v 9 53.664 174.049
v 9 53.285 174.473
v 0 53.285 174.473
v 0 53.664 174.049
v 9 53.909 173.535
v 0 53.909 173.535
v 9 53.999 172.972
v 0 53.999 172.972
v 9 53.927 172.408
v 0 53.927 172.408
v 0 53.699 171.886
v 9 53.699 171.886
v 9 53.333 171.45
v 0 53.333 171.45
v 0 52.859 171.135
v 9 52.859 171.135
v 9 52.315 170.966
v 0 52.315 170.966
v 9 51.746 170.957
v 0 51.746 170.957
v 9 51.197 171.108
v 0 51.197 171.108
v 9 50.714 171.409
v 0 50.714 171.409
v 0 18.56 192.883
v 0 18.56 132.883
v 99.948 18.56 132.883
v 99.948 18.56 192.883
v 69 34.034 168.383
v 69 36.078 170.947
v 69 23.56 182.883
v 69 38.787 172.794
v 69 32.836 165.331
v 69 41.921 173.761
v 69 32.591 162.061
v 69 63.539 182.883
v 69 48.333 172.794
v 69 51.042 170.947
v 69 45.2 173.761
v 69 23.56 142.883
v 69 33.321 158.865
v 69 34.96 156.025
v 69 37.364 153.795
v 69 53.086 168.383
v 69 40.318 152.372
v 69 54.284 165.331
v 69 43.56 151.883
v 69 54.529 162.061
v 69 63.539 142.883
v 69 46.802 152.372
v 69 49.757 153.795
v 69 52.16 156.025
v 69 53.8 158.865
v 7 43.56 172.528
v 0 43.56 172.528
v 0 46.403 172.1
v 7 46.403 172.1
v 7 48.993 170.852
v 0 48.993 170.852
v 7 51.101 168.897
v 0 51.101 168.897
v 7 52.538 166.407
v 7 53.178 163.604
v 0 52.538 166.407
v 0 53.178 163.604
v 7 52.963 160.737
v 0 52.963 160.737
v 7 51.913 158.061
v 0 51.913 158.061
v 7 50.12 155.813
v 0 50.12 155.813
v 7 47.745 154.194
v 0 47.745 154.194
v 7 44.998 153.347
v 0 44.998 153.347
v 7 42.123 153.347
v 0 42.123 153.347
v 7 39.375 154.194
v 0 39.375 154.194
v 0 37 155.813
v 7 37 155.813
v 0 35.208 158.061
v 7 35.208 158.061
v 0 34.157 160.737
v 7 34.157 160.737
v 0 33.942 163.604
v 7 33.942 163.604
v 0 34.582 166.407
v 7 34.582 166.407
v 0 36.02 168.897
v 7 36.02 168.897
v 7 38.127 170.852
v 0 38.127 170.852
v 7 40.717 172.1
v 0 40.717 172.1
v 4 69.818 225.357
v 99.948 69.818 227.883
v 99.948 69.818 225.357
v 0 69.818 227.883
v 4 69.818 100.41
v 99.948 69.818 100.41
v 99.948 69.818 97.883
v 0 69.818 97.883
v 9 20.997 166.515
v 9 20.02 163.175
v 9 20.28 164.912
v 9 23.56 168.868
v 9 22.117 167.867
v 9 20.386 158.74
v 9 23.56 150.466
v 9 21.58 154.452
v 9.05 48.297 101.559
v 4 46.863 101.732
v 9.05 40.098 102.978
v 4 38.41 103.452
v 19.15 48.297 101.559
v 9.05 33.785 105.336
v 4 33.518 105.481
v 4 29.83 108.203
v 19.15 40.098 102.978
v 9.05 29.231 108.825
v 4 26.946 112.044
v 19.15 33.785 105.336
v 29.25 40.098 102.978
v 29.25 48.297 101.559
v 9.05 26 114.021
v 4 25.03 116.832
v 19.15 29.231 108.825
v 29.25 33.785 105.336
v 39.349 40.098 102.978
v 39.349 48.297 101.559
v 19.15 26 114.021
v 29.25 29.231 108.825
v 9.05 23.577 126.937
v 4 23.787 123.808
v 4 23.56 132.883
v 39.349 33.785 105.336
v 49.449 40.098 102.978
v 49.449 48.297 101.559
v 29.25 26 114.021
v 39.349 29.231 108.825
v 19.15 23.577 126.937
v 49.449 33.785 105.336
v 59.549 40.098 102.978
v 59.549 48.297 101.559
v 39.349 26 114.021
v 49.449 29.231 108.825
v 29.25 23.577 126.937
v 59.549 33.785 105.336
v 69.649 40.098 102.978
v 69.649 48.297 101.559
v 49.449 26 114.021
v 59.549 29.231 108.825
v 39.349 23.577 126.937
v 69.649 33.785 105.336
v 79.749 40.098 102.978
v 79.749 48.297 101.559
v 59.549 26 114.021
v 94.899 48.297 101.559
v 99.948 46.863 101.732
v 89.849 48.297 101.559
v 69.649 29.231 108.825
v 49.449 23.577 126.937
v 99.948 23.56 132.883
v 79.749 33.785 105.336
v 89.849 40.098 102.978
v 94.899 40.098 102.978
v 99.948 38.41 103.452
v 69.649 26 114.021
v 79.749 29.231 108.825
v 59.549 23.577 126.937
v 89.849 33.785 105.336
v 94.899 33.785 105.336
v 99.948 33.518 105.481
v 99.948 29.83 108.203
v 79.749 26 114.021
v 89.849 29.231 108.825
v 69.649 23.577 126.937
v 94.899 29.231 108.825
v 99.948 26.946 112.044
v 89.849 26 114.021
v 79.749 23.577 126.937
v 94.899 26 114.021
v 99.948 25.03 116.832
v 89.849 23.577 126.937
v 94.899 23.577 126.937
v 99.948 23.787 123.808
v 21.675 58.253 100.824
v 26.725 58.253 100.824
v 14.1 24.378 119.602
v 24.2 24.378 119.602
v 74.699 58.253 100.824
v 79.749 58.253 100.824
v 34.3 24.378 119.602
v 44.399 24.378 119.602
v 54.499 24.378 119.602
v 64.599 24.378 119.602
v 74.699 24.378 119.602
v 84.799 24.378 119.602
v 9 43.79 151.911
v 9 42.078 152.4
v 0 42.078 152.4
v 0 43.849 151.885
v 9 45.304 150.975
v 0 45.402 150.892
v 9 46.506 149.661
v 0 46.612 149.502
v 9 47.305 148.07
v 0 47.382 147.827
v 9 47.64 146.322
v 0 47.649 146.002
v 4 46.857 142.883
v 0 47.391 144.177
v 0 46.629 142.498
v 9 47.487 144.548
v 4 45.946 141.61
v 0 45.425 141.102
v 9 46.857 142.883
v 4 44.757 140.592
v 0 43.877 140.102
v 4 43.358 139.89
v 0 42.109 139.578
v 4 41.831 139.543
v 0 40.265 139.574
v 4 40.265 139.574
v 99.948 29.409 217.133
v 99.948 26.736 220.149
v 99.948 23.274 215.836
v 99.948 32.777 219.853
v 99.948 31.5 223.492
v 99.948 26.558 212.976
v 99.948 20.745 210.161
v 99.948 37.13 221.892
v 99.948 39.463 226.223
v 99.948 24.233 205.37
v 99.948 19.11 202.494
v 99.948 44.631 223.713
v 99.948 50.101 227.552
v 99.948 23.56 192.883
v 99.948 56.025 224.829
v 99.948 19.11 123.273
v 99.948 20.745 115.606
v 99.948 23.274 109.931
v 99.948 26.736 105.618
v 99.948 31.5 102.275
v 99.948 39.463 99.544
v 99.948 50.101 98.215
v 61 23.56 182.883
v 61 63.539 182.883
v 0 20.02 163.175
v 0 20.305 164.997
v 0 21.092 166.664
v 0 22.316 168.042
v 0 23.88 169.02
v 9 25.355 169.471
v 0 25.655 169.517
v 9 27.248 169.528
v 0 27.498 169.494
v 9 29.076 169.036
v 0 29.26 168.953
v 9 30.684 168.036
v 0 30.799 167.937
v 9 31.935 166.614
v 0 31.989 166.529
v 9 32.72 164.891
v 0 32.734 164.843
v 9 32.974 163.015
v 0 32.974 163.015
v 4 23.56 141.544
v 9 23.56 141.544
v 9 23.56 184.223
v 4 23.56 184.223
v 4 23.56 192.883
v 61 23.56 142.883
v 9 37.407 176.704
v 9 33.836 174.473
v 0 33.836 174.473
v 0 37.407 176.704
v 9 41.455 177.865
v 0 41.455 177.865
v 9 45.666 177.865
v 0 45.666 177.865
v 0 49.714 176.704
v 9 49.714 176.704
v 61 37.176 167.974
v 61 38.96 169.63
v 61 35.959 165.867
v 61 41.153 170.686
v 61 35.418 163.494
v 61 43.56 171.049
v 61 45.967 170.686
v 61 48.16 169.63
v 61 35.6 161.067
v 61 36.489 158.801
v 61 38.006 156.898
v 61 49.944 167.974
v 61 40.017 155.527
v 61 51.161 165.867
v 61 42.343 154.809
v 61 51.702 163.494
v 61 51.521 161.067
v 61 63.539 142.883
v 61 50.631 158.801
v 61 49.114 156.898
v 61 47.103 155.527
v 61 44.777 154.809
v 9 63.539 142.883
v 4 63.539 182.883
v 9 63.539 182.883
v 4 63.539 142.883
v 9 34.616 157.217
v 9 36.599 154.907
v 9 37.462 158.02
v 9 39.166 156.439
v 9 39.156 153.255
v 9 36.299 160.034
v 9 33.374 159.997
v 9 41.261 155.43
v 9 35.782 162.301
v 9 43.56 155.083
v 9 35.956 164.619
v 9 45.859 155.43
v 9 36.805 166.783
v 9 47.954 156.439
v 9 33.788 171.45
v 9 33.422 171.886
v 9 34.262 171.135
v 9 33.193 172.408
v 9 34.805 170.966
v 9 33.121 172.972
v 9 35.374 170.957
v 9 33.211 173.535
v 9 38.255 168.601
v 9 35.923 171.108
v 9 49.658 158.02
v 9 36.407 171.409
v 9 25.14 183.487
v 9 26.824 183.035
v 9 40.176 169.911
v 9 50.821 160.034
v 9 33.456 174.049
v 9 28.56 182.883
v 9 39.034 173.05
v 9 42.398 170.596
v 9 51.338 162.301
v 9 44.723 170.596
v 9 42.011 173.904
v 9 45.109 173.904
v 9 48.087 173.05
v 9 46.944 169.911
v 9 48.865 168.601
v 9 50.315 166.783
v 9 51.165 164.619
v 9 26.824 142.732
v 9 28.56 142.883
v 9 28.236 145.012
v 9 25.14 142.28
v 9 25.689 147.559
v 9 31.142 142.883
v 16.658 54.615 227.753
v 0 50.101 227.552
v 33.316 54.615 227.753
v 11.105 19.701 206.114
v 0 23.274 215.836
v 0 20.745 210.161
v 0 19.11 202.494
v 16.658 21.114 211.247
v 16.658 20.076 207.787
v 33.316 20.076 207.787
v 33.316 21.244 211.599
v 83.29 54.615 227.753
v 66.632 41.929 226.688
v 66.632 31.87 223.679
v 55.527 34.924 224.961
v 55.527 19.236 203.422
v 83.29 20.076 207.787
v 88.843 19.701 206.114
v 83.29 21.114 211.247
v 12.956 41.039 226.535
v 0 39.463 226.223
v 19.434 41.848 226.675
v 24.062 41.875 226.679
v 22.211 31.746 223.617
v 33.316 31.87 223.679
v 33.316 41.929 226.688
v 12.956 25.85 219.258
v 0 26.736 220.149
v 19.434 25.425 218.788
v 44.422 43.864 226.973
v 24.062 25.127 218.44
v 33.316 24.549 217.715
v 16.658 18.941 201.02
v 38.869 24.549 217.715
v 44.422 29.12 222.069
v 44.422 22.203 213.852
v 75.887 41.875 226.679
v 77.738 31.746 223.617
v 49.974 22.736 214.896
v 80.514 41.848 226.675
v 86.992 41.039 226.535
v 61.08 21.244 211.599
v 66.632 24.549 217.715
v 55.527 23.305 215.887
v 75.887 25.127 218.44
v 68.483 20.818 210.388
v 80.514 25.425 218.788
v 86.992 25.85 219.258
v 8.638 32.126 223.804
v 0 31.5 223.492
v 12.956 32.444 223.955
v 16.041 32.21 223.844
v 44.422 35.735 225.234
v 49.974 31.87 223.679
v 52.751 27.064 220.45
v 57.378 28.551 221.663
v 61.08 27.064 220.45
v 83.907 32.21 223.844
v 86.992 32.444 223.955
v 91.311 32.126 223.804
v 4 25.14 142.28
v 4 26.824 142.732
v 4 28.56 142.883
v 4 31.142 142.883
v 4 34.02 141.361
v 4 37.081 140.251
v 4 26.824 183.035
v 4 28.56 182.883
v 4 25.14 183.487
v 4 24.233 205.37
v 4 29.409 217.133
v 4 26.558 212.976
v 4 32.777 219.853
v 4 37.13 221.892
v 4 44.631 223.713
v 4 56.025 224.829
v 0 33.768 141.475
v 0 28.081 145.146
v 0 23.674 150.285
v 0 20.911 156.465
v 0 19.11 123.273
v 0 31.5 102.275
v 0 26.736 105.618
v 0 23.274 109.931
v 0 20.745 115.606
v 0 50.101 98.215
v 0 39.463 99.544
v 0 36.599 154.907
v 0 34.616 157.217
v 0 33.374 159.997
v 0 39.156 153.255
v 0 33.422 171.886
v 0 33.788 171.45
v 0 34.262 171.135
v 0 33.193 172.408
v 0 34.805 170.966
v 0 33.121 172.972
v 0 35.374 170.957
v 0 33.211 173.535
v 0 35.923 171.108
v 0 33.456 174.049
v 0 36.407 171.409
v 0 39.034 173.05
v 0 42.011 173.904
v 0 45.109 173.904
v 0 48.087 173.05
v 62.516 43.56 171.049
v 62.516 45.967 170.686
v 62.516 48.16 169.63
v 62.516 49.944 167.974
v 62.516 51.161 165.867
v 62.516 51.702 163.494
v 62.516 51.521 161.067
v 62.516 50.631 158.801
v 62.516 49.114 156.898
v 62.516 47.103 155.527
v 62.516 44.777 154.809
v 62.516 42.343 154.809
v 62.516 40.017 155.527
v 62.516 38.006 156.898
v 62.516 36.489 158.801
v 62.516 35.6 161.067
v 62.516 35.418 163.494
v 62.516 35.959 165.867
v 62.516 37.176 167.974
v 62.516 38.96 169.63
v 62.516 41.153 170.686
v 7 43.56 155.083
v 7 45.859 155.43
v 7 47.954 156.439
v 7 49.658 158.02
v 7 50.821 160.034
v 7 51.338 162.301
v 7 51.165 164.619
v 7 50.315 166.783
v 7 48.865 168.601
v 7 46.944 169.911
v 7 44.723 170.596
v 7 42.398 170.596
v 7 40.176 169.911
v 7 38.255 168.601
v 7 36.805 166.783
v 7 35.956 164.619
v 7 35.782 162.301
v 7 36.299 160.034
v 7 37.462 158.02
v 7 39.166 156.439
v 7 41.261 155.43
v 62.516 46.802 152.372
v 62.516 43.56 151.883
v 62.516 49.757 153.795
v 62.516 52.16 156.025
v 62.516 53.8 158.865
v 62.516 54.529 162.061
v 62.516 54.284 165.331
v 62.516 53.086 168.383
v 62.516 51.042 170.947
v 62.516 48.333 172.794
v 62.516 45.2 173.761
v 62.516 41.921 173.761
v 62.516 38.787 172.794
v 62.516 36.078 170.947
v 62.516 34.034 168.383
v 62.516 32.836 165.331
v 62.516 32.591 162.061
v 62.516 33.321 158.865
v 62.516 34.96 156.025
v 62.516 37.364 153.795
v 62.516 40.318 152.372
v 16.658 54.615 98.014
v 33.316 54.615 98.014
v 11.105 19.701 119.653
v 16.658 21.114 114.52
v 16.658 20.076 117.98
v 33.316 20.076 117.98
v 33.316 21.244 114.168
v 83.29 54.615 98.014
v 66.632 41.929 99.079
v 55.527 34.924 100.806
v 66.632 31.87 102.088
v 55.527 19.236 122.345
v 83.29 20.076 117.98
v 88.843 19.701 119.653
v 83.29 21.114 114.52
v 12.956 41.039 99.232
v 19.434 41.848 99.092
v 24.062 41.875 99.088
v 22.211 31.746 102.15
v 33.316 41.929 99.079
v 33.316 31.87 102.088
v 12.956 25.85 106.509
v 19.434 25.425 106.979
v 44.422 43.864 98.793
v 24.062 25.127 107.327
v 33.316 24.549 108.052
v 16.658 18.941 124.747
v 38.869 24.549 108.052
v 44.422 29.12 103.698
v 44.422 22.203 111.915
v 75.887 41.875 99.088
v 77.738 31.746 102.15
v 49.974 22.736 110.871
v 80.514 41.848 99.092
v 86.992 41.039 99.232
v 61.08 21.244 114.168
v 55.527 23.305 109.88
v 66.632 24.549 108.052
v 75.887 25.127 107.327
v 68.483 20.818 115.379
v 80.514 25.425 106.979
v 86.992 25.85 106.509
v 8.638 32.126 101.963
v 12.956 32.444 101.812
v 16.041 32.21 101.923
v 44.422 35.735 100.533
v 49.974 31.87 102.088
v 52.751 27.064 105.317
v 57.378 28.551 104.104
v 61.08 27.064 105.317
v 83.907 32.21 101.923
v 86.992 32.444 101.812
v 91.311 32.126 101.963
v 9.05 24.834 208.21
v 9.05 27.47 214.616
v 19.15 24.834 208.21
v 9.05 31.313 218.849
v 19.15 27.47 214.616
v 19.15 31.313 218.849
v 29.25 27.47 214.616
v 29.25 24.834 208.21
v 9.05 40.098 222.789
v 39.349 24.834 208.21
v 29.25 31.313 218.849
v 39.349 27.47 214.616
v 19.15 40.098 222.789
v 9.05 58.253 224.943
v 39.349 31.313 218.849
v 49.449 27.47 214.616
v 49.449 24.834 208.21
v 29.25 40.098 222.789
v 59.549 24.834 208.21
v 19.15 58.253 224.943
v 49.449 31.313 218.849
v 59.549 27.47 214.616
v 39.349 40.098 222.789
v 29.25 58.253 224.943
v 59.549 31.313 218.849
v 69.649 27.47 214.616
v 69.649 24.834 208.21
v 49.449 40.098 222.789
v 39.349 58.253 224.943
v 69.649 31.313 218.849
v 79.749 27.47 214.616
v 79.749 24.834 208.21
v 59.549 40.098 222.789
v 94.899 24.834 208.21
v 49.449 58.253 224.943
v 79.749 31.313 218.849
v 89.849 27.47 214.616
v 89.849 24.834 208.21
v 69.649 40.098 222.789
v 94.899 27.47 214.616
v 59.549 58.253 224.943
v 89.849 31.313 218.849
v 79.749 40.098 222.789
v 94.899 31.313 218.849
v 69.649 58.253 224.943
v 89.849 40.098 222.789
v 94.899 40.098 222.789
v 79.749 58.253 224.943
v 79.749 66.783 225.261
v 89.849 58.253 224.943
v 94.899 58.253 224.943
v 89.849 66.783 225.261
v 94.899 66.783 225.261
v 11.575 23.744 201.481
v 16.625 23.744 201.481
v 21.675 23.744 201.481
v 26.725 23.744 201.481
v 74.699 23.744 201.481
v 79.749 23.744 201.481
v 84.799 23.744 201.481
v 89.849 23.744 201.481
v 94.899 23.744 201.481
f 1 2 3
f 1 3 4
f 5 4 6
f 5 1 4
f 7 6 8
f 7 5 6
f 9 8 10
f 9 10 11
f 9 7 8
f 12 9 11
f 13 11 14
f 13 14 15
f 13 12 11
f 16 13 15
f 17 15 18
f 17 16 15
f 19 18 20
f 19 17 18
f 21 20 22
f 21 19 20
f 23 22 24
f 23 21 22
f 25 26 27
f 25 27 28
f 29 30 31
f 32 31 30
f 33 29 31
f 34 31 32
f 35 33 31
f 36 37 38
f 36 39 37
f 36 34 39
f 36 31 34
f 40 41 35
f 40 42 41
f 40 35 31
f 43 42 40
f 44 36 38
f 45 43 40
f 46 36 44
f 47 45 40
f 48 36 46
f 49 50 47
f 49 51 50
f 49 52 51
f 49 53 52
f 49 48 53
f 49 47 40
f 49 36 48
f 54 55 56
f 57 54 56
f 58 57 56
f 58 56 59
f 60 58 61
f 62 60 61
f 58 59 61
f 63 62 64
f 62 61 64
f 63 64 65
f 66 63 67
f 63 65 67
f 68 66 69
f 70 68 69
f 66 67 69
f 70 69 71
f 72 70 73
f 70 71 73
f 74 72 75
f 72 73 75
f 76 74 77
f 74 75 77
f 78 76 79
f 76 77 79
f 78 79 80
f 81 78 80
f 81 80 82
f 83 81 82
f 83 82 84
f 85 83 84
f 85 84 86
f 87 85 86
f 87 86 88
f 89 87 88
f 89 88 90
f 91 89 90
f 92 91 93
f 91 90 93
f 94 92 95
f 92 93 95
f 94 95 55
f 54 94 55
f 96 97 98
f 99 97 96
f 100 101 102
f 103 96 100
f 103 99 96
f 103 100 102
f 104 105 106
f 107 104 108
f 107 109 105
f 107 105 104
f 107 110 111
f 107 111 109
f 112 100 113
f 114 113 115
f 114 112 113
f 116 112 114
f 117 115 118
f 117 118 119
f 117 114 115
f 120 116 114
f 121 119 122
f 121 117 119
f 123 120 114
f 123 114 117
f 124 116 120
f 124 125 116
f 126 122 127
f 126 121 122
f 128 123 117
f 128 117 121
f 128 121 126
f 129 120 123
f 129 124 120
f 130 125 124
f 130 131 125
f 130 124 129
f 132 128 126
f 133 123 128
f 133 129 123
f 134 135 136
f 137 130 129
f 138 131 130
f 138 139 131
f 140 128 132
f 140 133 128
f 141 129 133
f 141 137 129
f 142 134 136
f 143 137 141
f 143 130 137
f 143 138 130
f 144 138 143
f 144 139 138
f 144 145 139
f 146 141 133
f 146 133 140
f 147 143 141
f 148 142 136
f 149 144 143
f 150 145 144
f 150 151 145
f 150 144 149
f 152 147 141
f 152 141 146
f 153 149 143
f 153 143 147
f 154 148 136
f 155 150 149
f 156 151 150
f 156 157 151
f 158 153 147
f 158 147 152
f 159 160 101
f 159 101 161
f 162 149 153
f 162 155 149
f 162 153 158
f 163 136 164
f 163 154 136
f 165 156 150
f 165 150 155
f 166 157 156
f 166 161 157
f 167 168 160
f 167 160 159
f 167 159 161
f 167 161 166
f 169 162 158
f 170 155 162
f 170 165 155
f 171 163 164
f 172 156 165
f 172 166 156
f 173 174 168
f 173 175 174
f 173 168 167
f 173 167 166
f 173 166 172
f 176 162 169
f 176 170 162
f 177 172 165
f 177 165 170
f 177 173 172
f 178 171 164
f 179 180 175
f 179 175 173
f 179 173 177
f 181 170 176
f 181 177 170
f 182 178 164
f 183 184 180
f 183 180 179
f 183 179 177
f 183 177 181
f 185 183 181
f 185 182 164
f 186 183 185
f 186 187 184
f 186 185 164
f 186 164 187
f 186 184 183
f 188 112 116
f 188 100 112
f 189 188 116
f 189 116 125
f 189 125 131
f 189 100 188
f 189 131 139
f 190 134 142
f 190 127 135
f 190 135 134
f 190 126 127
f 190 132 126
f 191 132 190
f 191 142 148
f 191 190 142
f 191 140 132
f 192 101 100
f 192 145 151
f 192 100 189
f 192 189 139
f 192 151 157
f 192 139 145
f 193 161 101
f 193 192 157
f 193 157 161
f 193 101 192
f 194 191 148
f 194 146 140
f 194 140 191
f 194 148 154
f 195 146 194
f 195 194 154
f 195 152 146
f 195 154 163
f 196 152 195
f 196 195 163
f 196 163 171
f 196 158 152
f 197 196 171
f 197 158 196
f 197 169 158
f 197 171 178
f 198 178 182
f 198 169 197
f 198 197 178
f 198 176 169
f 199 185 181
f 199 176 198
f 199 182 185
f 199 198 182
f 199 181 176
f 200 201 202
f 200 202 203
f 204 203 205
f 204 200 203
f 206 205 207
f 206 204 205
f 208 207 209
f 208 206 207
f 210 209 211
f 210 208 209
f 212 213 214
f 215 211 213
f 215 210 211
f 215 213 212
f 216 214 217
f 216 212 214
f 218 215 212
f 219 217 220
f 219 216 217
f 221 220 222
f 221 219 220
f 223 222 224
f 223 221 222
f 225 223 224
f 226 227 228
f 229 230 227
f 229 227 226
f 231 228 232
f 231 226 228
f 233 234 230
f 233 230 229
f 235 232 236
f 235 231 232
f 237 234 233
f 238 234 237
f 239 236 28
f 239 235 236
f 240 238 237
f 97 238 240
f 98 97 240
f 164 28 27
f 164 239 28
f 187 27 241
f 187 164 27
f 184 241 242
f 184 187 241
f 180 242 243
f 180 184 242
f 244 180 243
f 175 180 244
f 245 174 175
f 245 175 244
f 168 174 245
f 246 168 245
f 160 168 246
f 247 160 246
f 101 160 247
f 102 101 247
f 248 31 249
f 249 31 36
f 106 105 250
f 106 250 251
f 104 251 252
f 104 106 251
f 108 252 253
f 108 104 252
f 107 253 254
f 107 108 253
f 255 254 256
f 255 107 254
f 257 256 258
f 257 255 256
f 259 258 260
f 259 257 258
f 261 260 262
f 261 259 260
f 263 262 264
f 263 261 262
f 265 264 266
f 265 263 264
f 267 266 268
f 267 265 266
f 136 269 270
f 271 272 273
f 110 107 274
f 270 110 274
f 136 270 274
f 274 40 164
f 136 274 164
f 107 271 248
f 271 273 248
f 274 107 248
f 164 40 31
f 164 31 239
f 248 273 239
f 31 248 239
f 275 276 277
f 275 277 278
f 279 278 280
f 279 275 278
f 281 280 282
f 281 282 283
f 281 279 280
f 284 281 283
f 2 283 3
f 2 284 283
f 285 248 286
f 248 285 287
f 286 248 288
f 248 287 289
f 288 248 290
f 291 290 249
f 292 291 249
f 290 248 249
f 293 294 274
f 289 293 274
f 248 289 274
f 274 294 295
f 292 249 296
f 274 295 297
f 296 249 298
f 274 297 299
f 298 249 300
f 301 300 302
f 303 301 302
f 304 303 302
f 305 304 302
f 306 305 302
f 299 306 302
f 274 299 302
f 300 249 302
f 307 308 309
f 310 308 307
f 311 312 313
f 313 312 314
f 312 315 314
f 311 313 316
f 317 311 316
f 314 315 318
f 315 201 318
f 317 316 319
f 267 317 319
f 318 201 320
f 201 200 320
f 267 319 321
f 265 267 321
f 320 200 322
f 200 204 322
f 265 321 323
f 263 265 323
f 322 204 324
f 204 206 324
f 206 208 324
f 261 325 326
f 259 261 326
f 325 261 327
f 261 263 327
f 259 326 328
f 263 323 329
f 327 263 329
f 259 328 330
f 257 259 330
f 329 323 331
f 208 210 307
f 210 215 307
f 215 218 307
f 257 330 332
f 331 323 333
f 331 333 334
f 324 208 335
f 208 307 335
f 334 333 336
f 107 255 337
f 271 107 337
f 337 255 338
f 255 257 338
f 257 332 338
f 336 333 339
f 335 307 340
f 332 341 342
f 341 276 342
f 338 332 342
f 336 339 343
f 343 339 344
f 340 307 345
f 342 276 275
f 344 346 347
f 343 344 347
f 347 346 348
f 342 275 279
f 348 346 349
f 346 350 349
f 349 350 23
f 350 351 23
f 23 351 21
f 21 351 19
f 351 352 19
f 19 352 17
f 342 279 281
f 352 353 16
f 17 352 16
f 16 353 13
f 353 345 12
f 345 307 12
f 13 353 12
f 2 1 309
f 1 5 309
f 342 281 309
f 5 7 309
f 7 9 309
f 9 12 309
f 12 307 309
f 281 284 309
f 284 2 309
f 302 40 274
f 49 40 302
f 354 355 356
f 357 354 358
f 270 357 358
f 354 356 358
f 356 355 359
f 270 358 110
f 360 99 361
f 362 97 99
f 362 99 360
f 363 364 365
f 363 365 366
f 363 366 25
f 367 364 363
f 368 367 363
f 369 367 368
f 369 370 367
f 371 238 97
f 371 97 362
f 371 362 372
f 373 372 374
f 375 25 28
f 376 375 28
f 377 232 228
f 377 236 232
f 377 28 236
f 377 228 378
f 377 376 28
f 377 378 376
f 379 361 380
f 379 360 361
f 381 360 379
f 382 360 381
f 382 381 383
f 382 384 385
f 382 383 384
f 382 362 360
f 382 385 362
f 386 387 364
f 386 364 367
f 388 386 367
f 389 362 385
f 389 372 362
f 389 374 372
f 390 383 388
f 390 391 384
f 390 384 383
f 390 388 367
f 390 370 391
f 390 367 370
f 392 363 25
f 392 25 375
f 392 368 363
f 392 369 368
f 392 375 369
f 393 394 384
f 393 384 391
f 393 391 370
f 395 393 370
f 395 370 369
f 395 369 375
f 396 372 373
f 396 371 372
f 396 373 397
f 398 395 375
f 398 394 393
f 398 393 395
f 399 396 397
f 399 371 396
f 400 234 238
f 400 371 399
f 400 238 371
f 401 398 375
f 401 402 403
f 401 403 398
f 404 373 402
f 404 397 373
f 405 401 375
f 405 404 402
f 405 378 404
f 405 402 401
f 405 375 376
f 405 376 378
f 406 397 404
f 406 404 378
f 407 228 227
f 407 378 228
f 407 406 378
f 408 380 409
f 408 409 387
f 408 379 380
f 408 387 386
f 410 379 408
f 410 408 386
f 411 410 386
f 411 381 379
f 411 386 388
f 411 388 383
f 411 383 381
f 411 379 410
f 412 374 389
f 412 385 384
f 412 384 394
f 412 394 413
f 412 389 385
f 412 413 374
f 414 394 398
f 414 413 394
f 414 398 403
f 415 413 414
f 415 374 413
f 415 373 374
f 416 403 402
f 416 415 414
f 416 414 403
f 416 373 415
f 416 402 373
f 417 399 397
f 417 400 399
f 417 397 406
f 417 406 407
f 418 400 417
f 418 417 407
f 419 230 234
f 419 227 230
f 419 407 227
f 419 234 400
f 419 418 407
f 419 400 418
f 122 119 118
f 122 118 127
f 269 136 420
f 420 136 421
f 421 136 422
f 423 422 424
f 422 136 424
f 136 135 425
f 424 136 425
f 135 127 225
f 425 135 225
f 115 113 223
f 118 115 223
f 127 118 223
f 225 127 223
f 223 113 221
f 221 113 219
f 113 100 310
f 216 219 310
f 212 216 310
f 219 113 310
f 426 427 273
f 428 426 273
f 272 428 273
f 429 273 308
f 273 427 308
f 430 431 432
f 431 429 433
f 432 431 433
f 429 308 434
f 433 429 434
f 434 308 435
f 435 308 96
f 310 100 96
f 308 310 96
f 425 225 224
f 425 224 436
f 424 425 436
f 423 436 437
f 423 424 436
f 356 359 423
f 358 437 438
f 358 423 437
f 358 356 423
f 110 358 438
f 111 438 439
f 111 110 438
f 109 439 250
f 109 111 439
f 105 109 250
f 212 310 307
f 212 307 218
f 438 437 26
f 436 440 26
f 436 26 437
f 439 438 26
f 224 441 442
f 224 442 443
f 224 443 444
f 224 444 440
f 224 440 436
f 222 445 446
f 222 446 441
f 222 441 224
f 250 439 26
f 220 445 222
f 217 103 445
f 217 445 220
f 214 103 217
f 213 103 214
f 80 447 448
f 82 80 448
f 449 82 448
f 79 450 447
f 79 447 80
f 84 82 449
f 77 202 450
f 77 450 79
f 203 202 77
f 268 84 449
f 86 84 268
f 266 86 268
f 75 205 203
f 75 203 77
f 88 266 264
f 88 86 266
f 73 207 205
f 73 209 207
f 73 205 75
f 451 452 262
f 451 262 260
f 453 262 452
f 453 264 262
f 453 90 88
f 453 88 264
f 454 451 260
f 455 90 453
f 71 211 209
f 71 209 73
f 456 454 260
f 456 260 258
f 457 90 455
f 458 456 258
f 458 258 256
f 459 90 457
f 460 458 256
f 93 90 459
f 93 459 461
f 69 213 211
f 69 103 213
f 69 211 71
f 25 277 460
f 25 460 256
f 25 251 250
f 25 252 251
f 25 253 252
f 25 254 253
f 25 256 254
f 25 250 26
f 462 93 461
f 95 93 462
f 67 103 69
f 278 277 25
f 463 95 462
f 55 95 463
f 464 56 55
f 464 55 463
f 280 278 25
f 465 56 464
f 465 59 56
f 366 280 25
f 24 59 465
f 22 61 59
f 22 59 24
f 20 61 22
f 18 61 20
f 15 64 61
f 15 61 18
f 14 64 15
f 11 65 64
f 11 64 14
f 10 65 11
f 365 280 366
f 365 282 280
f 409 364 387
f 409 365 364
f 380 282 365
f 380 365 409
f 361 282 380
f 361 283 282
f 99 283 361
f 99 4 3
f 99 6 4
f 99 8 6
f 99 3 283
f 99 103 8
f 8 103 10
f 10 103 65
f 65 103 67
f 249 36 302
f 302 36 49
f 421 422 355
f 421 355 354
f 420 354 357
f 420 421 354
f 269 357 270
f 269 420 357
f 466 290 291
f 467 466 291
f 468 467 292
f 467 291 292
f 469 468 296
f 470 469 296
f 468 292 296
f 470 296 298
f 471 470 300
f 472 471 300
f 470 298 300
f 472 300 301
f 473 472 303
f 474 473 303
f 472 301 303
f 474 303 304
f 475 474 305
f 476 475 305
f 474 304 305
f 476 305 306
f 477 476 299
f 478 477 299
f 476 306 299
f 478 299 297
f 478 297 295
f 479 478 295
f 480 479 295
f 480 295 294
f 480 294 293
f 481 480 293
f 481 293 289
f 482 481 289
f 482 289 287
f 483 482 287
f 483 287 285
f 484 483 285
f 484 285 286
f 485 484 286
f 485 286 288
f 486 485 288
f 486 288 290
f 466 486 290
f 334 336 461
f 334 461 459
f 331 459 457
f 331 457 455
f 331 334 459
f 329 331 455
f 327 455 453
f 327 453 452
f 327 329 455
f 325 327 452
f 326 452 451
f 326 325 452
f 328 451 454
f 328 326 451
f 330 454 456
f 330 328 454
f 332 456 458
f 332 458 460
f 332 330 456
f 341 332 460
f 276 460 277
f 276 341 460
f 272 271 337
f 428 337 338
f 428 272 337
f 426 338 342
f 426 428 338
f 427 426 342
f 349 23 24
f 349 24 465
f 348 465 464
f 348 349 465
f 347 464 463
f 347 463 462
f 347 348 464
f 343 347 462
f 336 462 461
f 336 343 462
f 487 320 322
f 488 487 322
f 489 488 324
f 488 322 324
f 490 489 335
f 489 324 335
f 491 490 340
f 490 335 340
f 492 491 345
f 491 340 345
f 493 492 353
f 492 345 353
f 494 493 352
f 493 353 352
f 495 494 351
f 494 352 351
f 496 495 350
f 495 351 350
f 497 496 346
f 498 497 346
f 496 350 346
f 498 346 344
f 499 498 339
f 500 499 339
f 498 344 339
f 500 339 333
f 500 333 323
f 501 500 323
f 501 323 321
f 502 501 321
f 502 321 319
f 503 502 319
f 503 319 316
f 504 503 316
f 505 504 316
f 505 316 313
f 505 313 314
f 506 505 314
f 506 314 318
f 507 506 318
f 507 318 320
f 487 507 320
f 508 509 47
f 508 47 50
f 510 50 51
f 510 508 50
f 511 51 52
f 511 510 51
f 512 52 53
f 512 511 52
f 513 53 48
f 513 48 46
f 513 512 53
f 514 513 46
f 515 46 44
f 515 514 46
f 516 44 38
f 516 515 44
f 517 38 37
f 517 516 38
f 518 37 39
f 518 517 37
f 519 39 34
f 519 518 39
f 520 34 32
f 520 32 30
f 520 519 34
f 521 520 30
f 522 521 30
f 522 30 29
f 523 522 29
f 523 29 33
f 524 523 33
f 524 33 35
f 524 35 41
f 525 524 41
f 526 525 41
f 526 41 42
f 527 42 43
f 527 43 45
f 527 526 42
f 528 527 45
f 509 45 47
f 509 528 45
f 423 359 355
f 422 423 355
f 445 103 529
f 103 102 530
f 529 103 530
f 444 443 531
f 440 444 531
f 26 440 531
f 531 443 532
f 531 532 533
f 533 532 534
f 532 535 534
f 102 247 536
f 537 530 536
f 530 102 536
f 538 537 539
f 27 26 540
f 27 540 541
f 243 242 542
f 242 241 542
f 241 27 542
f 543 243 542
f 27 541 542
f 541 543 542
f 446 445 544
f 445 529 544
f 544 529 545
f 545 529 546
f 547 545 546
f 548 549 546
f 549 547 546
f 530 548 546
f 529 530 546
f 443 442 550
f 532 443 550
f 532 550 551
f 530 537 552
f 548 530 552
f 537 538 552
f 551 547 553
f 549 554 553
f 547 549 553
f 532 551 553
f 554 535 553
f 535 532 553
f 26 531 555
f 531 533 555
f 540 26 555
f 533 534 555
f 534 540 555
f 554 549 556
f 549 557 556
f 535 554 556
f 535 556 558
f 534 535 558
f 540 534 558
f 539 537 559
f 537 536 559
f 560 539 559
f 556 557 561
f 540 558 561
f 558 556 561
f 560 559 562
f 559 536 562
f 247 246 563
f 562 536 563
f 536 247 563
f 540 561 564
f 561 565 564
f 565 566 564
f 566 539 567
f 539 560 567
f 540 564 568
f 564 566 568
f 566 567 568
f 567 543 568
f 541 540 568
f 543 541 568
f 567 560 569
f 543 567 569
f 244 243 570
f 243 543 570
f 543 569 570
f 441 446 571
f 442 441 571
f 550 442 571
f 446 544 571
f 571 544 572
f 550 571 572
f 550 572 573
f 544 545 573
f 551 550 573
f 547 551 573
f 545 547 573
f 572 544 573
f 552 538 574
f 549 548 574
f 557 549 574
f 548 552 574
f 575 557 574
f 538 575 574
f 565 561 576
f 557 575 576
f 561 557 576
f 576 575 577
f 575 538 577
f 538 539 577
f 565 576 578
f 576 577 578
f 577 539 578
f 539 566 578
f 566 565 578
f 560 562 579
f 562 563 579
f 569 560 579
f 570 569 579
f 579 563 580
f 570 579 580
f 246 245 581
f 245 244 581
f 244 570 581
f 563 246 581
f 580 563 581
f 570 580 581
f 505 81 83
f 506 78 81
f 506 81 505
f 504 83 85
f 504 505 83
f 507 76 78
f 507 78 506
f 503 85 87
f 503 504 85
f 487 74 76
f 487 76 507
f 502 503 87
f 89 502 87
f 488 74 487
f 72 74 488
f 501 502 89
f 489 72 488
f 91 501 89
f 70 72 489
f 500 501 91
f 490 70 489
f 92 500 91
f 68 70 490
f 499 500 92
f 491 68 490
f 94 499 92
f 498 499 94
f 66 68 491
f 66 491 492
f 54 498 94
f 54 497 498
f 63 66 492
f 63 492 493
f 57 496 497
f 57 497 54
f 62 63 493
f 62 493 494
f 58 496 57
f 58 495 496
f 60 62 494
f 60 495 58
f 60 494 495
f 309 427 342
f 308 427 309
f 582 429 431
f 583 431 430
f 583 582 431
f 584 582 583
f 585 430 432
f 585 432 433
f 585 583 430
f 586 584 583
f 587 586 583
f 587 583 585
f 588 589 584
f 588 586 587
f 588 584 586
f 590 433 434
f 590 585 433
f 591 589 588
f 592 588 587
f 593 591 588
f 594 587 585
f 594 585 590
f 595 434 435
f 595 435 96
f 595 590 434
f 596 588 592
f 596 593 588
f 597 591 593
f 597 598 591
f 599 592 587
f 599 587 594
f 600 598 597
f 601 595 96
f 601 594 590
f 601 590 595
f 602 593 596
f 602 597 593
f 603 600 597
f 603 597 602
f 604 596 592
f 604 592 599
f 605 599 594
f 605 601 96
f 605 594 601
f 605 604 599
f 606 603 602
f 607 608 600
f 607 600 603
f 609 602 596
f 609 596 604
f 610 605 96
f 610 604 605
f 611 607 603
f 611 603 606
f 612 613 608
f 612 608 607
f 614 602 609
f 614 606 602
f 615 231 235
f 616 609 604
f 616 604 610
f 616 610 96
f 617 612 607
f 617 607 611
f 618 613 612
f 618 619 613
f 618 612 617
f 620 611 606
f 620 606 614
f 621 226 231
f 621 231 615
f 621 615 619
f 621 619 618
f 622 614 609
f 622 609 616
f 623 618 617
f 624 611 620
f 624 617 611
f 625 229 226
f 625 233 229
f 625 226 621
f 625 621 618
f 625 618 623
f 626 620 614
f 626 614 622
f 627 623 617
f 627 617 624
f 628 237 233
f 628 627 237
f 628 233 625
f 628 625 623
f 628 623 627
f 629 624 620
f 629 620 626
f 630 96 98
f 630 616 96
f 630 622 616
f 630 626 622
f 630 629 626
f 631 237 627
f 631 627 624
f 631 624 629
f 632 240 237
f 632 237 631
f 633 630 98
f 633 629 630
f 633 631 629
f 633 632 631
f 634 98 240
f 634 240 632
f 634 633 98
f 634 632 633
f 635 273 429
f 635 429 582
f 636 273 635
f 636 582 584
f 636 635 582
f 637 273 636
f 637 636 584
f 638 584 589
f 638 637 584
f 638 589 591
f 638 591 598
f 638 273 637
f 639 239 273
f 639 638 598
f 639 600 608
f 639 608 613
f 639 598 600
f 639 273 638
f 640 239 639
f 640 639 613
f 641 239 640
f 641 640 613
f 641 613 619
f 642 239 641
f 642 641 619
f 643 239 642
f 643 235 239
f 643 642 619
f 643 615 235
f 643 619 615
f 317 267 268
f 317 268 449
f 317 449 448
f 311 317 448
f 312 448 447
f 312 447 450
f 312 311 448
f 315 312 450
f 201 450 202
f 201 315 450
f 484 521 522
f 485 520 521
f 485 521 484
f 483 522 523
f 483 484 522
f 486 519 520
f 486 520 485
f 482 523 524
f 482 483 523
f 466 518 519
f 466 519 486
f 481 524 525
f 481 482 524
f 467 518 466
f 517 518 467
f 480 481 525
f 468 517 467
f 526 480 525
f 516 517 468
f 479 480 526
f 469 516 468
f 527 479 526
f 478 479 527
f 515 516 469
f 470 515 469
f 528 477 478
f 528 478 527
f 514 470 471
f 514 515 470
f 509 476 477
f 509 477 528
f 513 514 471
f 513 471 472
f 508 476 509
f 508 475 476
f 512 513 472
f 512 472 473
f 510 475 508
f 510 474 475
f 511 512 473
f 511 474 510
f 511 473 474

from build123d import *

# Parameters (mm, degrees)
BOSS_EXTRU_2_DEPTH      = 9
ESQUISSE3_R             = 9.644620121
ENL_V_MAT_EXTRU_1_DEPTH = 7
ESQUISSE5_R             = 7.8
ENL_V_MAT_EXTRU_2_DEPTH = 6
ESQUISSE6_W             = 99.948483018
ESQUISSE6_H             = 60
BOSS_EXTRU_3_DEPTH      = 5
ESQUISSE7_W             = 40
ESQUISSE7_H             = 39.978494119
BOSS_EXTRU_4_DEPTH      = 8
ENL_V_START             = -6.48388
ESQUISSE8_R             = 11
ENL_V_MAT_EXTRU_3_DEPTH = 6.48388
ESQUISSE9_R             = 8.165208678
ENL_V_MAT_EXTRU_4_DEPTH = 5
BOSS_EXTRU_5_DEPTH      = 99.948483018
BOSS_EXTRU_6_DEPTH      = 4
ENL_V_START_2           = -9
ENL_V_MAT_EXTRU_5_DEPTH = 9


with BuildPart() as part:
    # Esquisse2 → Boss.-Extru.2 (new body)
    with BuildSketch(Plane.ZY):
        with BuildLine():
            Line((142.883448923, 63.538611727), (142.883448923, 43.560117608))
            Line((142.883448923, 43.560117608), (142.883448923, 28.560117608))
            ThreePointArc((142.883448923, 28.560117608), (142.005344344, 24.462432419), (139.52524414, 21.084386454))
            ThreePointArc((139.52524414, 21.084386454), (136.436102048, 19.212462514), (132.883448923, 18.560117608))
            Line((132.883448923, 18.560117608), (192.883448923, 18.560117608))
            ThreePointArc((192.883448923, 18.560117608), (185.812381111, 21.489049797), (182.883448923, 28.560117608))
            Line((182.883448923, 28.560117608), (182.883448923, 43.560117608))
            Line((182.883448923, 43.560117608), (182.883448923, 63.538611727))
            Line((182.883448923, 63.538611727), (163.81068824, 63.538611727))
            Line((163.81068824, 63.538611727), (161.956209605, 63.538611727))
            Line((161.956209605, 63.538611727), (142.883448923, 63.538611727))
        make_face()
    extrude(amount=-BOSS_EXTRU_2_DEPTH)

    # Esquisse3 → Enlèv. mat.-Extru.1 (cut)
    with BuildSketch(Plane.ZY):
        with Locations((162.883448923, 43.560117608)):
            Circle(ESQUISSE3_R)
    extrude(amount=-ENL_V_MAT_EXTRU_1_DEPTH, mode=Mode.SUBTRACT)

    # Esquisse5 → Enlèv. mat.-Extru.2 (cut)
    with BuildSketch(Plane(origin=(9, 0, 0), x_dir=(0, 0, -1), z_dir=(1, 0, 0))):
        with Locations((-162.883448923, 43.560117608)):
            Circle(ESQUISSE5_R)
    extrude(amount=-ENL_V_MAT_EXTRU_2_DEPTH, mode=Mode.SUBTRACT)

    # Esquisse6 → Boss.-Extru.3 (add)
    with BuildSketch(Plane.XZ.offset(-18.560117608)):
        with Locations((49.974241509, 162.883448923)):
            Rectangle(ESQUISSE6_W, ESQUISSE6_H)
    extrude(amount=-BOSS_EXTRU_3_DEPTH)

    # Esquisse7 → Boss.-Extru.4 (add)
    with BuildSketch(Plane(origin=(69, 0, 0), x_dir=(0, 0, -1), z_dir=(1, 0, 0))):
        with Locations((-162.883448923, 43.549364668)):
            Rectangle(ESQUISSE7_W, ESQUISSE7_H)
    extrude(amount=-BOSS_EXTRU_4_DEPTH)

    # Esquisse8 → Enlèv. mat.-Extru.3 (cut)
    with BuildSketch(Plane(origin=(69, 0, 0), x_dir=(0, 0, -1), z_dir=(1, 0, 0)).offset(ENL_V_START)):
        with Locations((-162.883448923, 43.560117608)):
            Circle(ESQUISSE8_R)
    extrude(amount=ENL_V_MAT_EXTRU_3_DEPTH, mode=Mode.SUBTRACT)

    # Esquisse9 → Enlèv. mat.-Extru.4 (cut)
    with BuildSketch(Plane.ZY.offset(-61)):
        with Locations((162.883448923, 43.560117608)):
            Circle(ESQUISSE9_R)
    extrude(amount=-ENL_V_MAT_EXTRU_4_DEPTH, mode=Mode.SUBTRACT)

    # Esquisse10 → Boss.-Extru.5 (add)
    with BuildSketch(Plane(origin=(99.948483018, 0, 0), x_dir=(0, 0, -1), z_dir=(1, 0, 0))):
        with BuildLine():
            Line((-97.883448923, 69.817685904), (-100.410150097, 69.817685904))
            add(Edge.make_bspline(
                [(-100.410150097, 69.817685904), (-100.442033213, 68.80607378), (-100.50563029, 66.760024387), (-100.63239049, 62.850470513), (-100.810316501, 58.185123949), (-101.105084062, 52.996004141), (-101.670642078, 46.633188552), (-102.817961278, 39.776477829), (-104.76530294, 34.527578685), (-106.865826561, 31.248687809), (-108.756421045, 29.177953286), (-111.059219045, 27.42366281), (-113.90944146, 25.950331771), (-117.143373053, 24.872521409), (-119.940370542, 24.290171621), (-122.233093244, 23.949469798), (-124.260913893, 23.72661052), (-126.900847008, 23.559278589), (-129.29031887, 23.506975385), (-131.301500979, 23.518901656), (-132.360719769, 23.543642683), (-132.883448923, 23.560117608)],
                knots=[0, 0, 0, 0, 0.03125, 0.0625, 0.125, 0.1875, 0.25, 0.375, 0.5, 0.5625, 0.625, 0.6875, 0.75, 0.8125, 0.859709617, 0.875334617, 0.90625, 0.9375, 0.96875, 0.984375, 1, 1, 1, 1], degree=3))
            Line((-132.883448923, 23.560117608), (-192.883448923, 23.560117608))
            add(Edge.make_bspline(
                [(-192.883448923, 23.560117608), (-193.406178076, 23.543642683), (-194.465396866, 23.518901656), (-196.476578975, 23.506975385), (-198.866050837, 23.559278589), (-201.50594164, 23.726607838), (-203.533727382, 23.949460813), (-205.826459718, 24.290158055), (-208.623496676, 24.872512038), (-211.857456385, 25.950331771), (-214.7076788, 27.42366281), (-217.0104768, 29.177953286), (-218.901071284, 31.248687809), (-221.001594905, 34.527578685), (-222.948936567, 39.776477829), (-224.096255768, 46.633188552), (-224.661813783, 52.996004141), (-224.956581344, 58.185123949), (-225.134507355, 62.850470513), (-225.261267555, 66.760024387), (-225.324864632, 68.80607378), (-225.356747748, 69.817685904)],
                knots=[0, 0, 0, 0, 0.015625, 0.03125, 0.0625, 0.09375, 0.124663886, 0.140288886, 0.1875, 0.25, 0.3125, 0.375, 0.4375, 0.5, 0.625, 0.75, 0.8125, 0.875, 0.9375, 0.96875, 1, 1, 1, 1], degree=3))
            Line((-225.356747748, 69.817685904), (-227.883448923, 69.817685904))
            add(Edge.make_bspline(
                [(-227.883448923, 69.817685904), (-227.883448923, 36.967980152), (-228.338510952, 18.560117608), (-192.883448923, 18.560117608)],
                knots=[0, 0, 0, 0, 1, 1, 1, 1], degree=3))
            Line((-192.883448923, 18.560117608), (-132.883448923, 18.560117608))
            add(Edge.make_bspline(
                [(-97.883448923, 69.817685904), (-97.883448923, 36.967980152), (-97.428386893, 18.560117608), (-132.883448923, 18.560117608)],
                knots=[0, 0, 0, 0, 1, 1, 1, 1], degree=3))
        make_face()
    extrude(amount=-BOSS_EXTRU_5_DEPTH)

    # Esquisse11 → Boss.-Extru.6 (add)
    with BuildSketch(Plane.ZY):
        with BuildLine():
            Line((225.356747748, 69.817685904), (100.410150097, 69.817685904))
            add(Edge.make_bspline(
                [(100.410150097, 69.817685904), (100.442033213, 68.80607378), (100.50563029, 66.760024387), (100.63239049, 62.850470513), (100.810316501, 58.185123949), (101.105084062, 52.996004141), (101.670642078, 46.633188552), (102.817961278, 39.776477829), (104.76530294, 34.527578685), (106.865826561, 31.248687809), (108.756421045, 29.177953286), (111.059219045, 27.42366281), (113.90944146, 25.950331771), (117.143373053, 24.872521409), (119.940370542, 24.290171621), (122.233093244, 23.949469798), (124.260913893, 23.72661052), (126.900847008, 23.559278589), (129.29031887, 23.506975385), (131.301500979, 23.518901656), (132.360719769, 23.543642683), (132.883448923, 23.560117608)],
                knots=[0, 0, 0, 0, 0.03125, 0.0625, 0.125, 0.1875, 0.25, 0.375, 0.5, 0.5625, 0.625, 0.6875, 0.75, 0.8125, 0.859709617, 0.875334617, 0.90625, 0.9375, 0.96875, 0.984375, 1, 1, 1, 1], degree=3))
            Line((132.883448923, 23.560117608), (141.54370296, 23.560117608))
            ThreePointArc((141.54370296, 23.560117608), (142.542707185, 25.971927157), (142.883448923, 28.560117608))
            Line((142.883448923, 28.560117608), (142.883448923, 63.538611727))
            Line((142.883448923, 63.538611727), (182.883448923, 63.538611727))
            Line((182.883448923, 63.538611727), (182.883448923, 28.560117608))
            ThreePointArc((182.883448923, 28.560117608), (183.22419066, 25.971927157), (184.223194885, 23.560117608))
            Line((184.223194885, 23.560117608), (192.883448923, 23.560117608))
            add(Edge.make_bspline(
                [(192.883448923, 23.560117608), (193.406178076, 23.543642683), (194.465396866, 23.518901656), (196.476578975, 23.506975385), (198.866050837, 23.559278589), (201.50594164, 23.726607838), (203.533727382, 23.949460813), (205.826459718, 24.290158055), (208.623496676, 24.872512038), (211.857456385, 25.950331771), (214.7076788, 27.42366281), (217.0104768, 29.177953286), (218.901071284, 31.248687809), (221.001594905, 34.527578685), (222.948936567, 39.776477829), (224.096255768, 46.633188552), (224.661813783, 52.996004141), (224.956581344, 58.185123949), (225.134507355, 62.850470513), (225.261267555, 66.760024387), (225.324864632, 68.80607378), (225.356747748, 69.817685904)],
                knots=[0, 0, 0, 0, 0.015625, 0.03125, 0.0625, 0.09375, 0.124663886, 0.140288886, 0.1875, 0.25, 0.3125, 0.375, 0.4375, 0.5, 0.625, 0.75, 0.8125, 0.875, 0.9375, 0.96875, 1, 1, 1, 1], degree=3))
        make_face()
    extrude(amount=-BOSS_EXTRU_6_DEPTH)

    # Esquisse12 → Enlèv. mat.-Extru.5 (cut)
    with BuildSketch(Plane.ZY.offset(ENL_V_START_2)):
        with BuildLine():
            ThreePointArc((163.014719877, 32.973509037), (155.990303326, 35.524070266), (152.400224234, 42.078391173))
            ThreePointArc((152.400224234, 42.078391173), (145.080424512, 47.585238943), (139.573576742, 40.265439221))
            ThreePointArc((139.573576742, 40.265439221), (147.556262152, 25.691642787), (163.175335174, 20.020367203))
            ThreePointArc((163.175335174, 20.020367203), (169.571598443, 26.577245769), (163.014719877, 32.973509037))
        make_face()
        with BuildLine():
            ThreePointArc((171.408584799, 50.713555978), (174.012223438, 43.560117608), (171.408584799, 36.406679239))
            ThreePointArc((171.408584799, 36.406679239), (171.655098465, 33.589015134), (174.472762571, 33.8355288))
            ThreePointArc((174.472762571, 33.8355288), (178.012223438, 43.560117608), (174.472762571, 53.284706416))
            ThreePointArc((174.472762571, 53.284706416), (171.655098465, 53.531220083), (171.408584799, 50.713555978))
        make_face()
    extrude(amount=ENL_V_MAT_EXTRU_5_DEPTH, mode=Mode.SUBTRACT)


solid = part.part
